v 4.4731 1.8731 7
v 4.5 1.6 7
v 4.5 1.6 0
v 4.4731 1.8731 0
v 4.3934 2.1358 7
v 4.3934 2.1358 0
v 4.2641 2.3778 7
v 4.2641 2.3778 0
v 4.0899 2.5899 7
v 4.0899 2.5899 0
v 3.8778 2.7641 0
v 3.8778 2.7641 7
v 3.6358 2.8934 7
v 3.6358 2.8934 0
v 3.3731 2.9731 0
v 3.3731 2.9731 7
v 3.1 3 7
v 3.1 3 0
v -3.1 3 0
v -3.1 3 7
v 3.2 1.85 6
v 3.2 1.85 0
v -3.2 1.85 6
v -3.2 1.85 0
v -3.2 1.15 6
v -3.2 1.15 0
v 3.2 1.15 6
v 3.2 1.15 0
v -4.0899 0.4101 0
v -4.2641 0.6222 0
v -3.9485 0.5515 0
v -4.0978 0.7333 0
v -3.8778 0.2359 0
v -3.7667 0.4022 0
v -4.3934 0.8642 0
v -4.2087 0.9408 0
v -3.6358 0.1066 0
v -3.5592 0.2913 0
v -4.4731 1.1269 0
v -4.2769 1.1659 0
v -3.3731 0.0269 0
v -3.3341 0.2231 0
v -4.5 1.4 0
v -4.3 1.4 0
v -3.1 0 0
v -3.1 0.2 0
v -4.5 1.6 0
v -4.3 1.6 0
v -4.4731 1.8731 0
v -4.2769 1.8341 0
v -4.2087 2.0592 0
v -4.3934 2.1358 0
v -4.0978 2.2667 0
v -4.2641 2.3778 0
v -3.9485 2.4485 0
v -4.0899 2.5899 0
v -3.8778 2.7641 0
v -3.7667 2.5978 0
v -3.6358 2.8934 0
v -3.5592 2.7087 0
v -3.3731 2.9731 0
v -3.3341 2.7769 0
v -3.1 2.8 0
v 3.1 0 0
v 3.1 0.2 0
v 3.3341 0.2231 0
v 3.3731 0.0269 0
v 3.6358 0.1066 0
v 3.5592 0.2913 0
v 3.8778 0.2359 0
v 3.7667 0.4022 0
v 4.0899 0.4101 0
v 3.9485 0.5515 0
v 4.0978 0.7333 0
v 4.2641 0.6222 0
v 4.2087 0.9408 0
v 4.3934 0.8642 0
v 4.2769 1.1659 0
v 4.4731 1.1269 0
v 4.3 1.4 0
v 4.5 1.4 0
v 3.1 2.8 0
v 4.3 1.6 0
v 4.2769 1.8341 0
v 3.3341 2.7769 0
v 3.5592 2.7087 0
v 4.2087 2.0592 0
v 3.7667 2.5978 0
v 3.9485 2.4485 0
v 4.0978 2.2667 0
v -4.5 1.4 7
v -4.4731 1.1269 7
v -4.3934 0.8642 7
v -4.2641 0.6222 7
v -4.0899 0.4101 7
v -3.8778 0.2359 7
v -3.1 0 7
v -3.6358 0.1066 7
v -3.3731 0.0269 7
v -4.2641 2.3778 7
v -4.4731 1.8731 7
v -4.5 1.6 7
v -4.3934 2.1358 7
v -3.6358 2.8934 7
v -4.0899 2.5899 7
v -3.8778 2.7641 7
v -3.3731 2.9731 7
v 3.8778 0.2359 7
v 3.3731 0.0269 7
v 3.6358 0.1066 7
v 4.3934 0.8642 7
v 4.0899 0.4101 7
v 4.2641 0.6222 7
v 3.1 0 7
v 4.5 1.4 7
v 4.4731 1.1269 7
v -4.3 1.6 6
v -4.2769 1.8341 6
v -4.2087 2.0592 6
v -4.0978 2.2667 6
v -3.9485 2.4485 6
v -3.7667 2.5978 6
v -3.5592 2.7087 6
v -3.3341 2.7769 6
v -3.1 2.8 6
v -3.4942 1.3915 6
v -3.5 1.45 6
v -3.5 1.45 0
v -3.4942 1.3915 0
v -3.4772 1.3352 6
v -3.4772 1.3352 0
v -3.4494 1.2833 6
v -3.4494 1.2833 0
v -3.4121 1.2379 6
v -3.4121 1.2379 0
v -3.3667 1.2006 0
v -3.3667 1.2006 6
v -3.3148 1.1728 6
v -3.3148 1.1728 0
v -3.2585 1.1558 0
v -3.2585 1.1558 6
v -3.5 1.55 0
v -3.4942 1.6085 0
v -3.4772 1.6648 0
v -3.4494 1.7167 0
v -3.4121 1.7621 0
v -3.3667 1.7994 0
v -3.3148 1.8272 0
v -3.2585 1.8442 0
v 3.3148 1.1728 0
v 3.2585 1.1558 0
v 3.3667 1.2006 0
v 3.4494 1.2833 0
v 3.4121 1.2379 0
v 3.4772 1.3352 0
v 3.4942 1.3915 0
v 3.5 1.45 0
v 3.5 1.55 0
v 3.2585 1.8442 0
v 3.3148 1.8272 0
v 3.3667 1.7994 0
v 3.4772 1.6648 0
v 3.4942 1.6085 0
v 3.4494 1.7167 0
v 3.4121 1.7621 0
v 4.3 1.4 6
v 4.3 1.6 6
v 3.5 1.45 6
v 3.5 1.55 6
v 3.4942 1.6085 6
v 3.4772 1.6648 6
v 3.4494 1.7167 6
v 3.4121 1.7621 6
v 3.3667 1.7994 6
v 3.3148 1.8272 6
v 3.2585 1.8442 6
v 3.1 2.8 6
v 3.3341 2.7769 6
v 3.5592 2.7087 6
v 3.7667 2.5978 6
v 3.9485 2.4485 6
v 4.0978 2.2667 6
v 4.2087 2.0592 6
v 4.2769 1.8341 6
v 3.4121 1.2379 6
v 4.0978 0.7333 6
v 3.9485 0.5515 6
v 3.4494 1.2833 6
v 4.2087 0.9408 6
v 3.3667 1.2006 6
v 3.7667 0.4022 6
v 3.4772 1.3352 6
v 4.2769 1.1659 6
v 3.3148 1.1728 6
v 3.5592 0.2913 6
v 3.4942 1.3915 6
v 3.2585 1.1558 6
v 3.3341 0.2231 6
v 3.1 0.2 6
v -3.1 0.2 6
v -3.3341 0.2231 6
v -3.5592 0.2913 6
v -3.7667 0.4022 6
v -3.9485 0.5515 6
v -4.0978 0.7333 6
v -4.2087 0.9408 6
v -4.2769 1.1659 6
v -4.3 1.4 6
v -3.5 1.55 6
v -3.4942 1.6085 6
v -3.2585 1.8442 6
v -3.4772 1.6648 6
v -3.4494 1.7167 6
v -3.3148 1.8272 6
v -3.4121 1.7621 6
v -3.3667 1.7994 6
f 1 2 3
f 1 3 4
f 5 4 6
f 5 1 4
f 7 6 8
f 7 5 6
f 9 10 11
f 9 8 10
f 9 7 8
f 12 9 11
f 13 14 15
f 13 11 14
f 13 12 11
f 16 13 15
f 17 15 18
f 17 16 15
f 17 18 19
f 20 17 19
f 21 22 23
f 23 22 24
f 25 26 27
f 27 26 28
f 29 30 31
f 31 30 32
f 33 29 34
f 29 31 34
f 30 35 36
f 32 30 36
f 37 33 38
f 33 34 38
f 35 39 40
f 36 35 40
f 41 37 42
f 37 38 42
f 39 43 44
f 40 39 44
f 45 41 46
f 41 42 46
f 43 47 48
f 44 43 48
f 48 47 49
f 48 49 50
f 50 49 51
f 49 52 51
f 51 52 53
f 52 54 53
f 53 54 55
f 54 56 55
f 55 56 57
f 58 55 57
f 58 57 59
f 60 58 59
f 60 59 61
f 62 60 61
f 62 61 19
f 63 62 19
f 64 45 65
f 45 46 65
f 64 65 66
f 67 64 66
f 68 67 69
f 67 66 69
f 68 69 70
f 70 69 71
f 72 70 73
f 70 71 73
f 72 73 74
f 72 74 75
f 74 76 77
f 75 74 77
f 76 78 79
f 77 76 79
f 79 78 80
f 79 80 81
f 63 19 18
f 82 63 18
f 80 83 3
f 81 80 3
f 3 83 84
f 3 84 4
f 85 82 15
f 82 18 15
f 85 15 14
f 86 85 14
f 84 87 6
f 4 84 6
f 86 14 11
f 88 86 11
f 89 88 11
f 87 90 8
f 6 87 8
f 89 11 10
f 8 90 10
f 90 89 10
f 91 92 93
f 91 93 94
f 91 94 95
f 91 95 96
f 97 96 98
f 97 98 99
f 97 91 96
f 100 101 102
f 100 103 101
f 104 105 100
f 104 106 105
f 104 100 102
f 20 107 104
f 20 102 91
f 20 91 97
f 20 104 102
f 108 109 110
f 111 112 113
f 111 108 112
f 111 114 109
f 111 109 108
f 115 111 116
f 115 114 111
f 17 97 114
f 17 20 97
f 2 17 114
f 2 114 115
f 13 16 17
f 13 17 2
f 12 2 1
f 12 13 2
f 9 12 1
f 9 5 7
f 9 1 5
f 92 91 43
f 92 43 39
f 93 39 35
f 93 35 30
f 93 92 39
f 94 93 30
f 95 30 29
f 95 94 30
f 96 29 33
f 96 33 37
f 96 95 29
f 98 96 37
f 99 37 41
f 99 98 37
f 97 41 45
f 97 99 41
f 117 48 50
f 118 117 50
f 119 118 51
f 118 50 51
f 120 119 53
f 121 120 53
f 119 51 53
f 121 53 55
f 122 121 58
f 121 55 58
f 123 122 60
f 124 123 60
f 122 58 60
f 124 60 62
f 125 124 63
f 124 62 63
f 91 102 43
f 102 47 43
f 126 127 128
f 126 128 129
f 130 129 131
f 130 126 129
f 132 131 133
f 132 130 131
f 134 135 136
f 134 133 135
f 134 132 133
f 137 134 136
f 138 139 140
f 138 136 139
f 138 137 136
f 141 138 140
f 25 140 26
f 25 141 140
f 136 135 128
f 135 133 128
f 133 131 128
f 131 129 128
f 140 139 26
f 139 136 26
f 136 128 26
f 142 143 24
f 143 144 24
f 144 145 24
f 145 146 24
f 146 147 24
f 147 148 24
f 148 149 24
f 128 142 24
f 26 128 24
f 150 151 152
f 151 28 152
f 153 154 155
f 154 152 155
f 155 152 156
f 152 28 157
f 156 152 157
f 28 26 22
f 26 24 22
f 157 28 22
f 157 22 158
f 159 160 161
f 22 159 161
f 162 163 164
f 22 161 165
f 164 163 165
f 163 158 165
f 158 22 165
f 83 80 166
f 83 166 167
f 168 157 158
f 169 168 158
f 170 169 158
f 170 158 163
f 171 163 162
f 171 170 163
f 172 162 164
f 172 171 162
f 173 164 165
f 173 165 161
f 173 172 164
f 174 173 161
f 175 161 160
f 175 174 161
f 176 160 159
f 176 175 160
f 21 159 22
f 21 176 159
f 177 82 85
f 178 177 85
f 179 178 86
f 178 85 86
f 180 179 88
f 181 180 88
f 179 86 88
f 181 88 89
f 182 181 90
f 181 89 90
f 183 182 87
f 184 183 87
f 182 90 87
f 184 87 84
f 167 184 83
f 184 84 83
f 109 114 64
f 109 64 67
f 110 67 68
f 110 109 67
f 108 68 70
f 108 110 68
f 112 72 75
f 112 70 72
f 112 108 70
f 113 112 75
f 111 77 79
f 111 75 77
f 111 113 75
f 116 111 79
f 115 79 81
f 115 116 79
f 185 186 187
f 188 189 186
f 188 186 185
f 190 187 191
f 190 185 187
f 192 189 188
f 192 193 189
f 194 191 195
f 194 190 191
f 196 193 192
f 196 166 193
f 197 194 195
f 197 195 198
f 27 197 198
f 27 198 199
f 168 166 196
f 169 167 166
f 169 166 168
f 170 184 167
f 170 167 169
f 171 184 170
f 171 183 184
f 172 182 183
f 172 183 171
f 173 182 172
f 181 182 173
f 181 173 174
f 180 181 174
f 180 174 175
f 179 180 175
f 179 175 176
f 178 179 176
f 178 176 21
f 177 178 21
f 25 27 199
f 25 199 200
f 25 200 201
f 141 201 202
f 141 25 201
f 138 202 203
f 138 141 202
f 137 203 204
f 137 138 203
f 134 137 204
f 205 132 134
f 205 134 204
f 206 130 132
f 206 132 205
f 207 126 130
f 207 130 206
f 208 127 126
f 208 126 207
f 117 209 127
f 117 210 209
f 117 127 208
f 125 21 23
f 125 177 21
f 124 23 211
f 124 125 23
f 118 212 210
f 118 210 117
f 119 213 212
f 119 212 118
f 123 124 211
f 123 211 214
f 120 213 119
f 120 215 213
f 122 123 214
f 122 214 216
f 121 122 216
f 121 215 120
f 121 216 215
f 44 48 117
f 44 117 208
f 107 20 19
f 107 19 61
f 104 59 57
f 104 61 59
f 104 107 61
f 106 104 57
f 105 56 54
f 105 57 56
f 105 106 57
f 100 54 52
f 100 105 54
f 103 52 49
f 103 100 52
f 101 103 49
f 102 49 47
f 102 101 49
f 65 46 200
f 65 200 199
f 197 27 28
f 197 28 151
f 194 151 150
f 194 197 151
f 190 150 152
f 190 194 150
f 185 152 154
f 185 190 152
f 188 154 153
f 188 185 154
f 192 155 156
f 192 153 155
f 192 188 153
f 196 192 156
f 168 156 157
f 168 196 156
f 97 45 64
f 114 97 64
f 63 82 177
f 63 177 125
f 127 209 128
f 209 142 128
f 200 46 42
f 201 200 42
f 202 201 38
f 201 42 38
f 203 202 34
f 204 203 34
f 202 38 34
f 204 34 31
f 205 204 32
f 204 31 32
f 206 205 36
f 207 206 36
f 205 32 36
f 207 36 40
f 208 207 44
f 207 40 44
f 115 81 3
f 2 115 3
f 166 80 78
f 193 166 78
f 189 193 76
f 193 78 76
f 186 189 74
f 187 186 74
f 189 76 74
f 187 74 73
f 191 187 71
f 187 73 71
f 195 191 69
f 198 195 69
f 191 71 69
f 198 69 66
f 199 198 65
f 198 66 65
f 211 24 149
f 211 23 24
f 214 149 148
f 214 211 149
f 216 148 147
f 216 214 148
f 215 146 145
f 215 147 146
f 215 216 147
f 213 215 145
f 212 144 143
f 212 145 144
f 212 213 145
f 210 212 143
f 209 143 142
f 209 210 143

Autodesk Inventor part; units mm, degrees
ref_plane "YZ Plane" through (0, 0, 0) normal (1, 0, 0) x (0, 1, 0)
ref_plane "XZ Plane" through (0, 0, 0) normal (0, 1, 0) x (-1, 0, 0)
ref_plane "XY Plane" through (0, 0, 0) normal (0, 0, 1) x (1, 0, 0)
sketch "Sketch1" plane through (0, 0, 0) normal (0, 0, 1) x (1, 0, 0)
  line L0 (-4.5, 0) -> (4.5, 0)
  line L1 (4.5, 0) -> (4.5, 3)
  line L2 (4.5, 3) -> (-4.5, 3)
  line L3 (-4.5, 3) -> (-4.5, 0)
  line L4 (-4.5, 0) -> (4.5, 3) construction
  line L5 (4.5, 0) -> (-4.5, 3) construction
  point P0 (0, 0)
  point P1 (0, 0)
  dimension "d0" = 9
  dimension "d1" = 3
extrude "Extrusion1" add sketch "Sketch1" along normal blind 7
fillet "Fillet1" radius 1.4 4 edges at (4.5, 3, 3.5) (-4.5, 3, 3.5) (-4.5, 0, 3.5) (4.5, 0, 3.5)
sketch "Sketch2" plane through (0, 0, 0) normal (0, 0, -1) x (-1, 0, 0)
  arc A0 (-4.5, 1.4) -> (-3.1, 0) centre (-3.1, 1.4) ccw projected
  line L0 (3.1, 0) -> (-3.1, 0) projected
  arc A1 (3.1, 0) -> (4.5, 1.4) centre (3.1, 1.4) ccw projected
  line L1 (4.5, 1.6) -> (4.5, 1.4) projected
  arc A2 (4.5, 1.6) -> (3.1, 3) centre (3.1, 1.6) ccw projected
  line L2 (-3.1, 3) -> (3.1, 3) projected
  arc A3 (-3.1, 3) -> (-4.5, 1.6) centre (-3.1, 1.6) ccw projected
  line L3 (-4.5, 1.4) -> (-4.5, 1.6) projected
  arc A4 (4.3, 1.6) -> (3.1, 2.8) centre (3.1, 1.6) ccw
  line L4 (4.3, 1.6) -> (4.3, 1.4)
  arc A5 (3.1, 0.2) -> (4.3, 1.4) centre (3.1, 1.4) ccw
  line L5 (3.1, 0.2) -> (-3.1, 0.2)
  arc A6 (-4.3, 1.4) -> (-3.1, 0.2) centre (-3.1, 1.4) ccw
  line L6 (-4.3, 1.4) -> (-4.3, 1.6)
  arc A7 (-3.1, 2.8) -> (-4.3, 1.6) centre (-3.1, 1.6) ccw
  line L7 (-3.1, 2.8) -> (3.1, 2.8)
  line L8 (-3.5, 1.85) -> (3.5, 1.85)
  line L9 (3.5, 1.85) -> (3.5, 1.15)
  line L10 (3.5, 1.15) -> (-3.5, 1.15)
  line L11 (-3.5, 1.15) -> (-3.5, 1.85)
  line L12 (-3.5, 1.85) -> (3.5, 1.15) construction
  line L13 (3.5, 1.85) -> (-3.5, 1.15) construction
  point P0 (0, 0)
  point P1 (0, 1.5)
  point P2 (4.5, 1.5)
  point P3 (0, 0)
  dimension "d5" = 0.2
  dimension "d6" = 7
  dimension "d7" = 0.7
extrude "Extrusion2" cut sketch "Sketch2" against normal blind 6 contours L4 A5 L5 A6 L6 A7 L7 A4
fillet "Fillet2" radius 0.3 4 edges at (3.5, 1.15, 3) (3.5, 1.85, 3) (-3.5, 1.15, 3) (-3.5, 1.85, 3)
properties part number "USB_C"
